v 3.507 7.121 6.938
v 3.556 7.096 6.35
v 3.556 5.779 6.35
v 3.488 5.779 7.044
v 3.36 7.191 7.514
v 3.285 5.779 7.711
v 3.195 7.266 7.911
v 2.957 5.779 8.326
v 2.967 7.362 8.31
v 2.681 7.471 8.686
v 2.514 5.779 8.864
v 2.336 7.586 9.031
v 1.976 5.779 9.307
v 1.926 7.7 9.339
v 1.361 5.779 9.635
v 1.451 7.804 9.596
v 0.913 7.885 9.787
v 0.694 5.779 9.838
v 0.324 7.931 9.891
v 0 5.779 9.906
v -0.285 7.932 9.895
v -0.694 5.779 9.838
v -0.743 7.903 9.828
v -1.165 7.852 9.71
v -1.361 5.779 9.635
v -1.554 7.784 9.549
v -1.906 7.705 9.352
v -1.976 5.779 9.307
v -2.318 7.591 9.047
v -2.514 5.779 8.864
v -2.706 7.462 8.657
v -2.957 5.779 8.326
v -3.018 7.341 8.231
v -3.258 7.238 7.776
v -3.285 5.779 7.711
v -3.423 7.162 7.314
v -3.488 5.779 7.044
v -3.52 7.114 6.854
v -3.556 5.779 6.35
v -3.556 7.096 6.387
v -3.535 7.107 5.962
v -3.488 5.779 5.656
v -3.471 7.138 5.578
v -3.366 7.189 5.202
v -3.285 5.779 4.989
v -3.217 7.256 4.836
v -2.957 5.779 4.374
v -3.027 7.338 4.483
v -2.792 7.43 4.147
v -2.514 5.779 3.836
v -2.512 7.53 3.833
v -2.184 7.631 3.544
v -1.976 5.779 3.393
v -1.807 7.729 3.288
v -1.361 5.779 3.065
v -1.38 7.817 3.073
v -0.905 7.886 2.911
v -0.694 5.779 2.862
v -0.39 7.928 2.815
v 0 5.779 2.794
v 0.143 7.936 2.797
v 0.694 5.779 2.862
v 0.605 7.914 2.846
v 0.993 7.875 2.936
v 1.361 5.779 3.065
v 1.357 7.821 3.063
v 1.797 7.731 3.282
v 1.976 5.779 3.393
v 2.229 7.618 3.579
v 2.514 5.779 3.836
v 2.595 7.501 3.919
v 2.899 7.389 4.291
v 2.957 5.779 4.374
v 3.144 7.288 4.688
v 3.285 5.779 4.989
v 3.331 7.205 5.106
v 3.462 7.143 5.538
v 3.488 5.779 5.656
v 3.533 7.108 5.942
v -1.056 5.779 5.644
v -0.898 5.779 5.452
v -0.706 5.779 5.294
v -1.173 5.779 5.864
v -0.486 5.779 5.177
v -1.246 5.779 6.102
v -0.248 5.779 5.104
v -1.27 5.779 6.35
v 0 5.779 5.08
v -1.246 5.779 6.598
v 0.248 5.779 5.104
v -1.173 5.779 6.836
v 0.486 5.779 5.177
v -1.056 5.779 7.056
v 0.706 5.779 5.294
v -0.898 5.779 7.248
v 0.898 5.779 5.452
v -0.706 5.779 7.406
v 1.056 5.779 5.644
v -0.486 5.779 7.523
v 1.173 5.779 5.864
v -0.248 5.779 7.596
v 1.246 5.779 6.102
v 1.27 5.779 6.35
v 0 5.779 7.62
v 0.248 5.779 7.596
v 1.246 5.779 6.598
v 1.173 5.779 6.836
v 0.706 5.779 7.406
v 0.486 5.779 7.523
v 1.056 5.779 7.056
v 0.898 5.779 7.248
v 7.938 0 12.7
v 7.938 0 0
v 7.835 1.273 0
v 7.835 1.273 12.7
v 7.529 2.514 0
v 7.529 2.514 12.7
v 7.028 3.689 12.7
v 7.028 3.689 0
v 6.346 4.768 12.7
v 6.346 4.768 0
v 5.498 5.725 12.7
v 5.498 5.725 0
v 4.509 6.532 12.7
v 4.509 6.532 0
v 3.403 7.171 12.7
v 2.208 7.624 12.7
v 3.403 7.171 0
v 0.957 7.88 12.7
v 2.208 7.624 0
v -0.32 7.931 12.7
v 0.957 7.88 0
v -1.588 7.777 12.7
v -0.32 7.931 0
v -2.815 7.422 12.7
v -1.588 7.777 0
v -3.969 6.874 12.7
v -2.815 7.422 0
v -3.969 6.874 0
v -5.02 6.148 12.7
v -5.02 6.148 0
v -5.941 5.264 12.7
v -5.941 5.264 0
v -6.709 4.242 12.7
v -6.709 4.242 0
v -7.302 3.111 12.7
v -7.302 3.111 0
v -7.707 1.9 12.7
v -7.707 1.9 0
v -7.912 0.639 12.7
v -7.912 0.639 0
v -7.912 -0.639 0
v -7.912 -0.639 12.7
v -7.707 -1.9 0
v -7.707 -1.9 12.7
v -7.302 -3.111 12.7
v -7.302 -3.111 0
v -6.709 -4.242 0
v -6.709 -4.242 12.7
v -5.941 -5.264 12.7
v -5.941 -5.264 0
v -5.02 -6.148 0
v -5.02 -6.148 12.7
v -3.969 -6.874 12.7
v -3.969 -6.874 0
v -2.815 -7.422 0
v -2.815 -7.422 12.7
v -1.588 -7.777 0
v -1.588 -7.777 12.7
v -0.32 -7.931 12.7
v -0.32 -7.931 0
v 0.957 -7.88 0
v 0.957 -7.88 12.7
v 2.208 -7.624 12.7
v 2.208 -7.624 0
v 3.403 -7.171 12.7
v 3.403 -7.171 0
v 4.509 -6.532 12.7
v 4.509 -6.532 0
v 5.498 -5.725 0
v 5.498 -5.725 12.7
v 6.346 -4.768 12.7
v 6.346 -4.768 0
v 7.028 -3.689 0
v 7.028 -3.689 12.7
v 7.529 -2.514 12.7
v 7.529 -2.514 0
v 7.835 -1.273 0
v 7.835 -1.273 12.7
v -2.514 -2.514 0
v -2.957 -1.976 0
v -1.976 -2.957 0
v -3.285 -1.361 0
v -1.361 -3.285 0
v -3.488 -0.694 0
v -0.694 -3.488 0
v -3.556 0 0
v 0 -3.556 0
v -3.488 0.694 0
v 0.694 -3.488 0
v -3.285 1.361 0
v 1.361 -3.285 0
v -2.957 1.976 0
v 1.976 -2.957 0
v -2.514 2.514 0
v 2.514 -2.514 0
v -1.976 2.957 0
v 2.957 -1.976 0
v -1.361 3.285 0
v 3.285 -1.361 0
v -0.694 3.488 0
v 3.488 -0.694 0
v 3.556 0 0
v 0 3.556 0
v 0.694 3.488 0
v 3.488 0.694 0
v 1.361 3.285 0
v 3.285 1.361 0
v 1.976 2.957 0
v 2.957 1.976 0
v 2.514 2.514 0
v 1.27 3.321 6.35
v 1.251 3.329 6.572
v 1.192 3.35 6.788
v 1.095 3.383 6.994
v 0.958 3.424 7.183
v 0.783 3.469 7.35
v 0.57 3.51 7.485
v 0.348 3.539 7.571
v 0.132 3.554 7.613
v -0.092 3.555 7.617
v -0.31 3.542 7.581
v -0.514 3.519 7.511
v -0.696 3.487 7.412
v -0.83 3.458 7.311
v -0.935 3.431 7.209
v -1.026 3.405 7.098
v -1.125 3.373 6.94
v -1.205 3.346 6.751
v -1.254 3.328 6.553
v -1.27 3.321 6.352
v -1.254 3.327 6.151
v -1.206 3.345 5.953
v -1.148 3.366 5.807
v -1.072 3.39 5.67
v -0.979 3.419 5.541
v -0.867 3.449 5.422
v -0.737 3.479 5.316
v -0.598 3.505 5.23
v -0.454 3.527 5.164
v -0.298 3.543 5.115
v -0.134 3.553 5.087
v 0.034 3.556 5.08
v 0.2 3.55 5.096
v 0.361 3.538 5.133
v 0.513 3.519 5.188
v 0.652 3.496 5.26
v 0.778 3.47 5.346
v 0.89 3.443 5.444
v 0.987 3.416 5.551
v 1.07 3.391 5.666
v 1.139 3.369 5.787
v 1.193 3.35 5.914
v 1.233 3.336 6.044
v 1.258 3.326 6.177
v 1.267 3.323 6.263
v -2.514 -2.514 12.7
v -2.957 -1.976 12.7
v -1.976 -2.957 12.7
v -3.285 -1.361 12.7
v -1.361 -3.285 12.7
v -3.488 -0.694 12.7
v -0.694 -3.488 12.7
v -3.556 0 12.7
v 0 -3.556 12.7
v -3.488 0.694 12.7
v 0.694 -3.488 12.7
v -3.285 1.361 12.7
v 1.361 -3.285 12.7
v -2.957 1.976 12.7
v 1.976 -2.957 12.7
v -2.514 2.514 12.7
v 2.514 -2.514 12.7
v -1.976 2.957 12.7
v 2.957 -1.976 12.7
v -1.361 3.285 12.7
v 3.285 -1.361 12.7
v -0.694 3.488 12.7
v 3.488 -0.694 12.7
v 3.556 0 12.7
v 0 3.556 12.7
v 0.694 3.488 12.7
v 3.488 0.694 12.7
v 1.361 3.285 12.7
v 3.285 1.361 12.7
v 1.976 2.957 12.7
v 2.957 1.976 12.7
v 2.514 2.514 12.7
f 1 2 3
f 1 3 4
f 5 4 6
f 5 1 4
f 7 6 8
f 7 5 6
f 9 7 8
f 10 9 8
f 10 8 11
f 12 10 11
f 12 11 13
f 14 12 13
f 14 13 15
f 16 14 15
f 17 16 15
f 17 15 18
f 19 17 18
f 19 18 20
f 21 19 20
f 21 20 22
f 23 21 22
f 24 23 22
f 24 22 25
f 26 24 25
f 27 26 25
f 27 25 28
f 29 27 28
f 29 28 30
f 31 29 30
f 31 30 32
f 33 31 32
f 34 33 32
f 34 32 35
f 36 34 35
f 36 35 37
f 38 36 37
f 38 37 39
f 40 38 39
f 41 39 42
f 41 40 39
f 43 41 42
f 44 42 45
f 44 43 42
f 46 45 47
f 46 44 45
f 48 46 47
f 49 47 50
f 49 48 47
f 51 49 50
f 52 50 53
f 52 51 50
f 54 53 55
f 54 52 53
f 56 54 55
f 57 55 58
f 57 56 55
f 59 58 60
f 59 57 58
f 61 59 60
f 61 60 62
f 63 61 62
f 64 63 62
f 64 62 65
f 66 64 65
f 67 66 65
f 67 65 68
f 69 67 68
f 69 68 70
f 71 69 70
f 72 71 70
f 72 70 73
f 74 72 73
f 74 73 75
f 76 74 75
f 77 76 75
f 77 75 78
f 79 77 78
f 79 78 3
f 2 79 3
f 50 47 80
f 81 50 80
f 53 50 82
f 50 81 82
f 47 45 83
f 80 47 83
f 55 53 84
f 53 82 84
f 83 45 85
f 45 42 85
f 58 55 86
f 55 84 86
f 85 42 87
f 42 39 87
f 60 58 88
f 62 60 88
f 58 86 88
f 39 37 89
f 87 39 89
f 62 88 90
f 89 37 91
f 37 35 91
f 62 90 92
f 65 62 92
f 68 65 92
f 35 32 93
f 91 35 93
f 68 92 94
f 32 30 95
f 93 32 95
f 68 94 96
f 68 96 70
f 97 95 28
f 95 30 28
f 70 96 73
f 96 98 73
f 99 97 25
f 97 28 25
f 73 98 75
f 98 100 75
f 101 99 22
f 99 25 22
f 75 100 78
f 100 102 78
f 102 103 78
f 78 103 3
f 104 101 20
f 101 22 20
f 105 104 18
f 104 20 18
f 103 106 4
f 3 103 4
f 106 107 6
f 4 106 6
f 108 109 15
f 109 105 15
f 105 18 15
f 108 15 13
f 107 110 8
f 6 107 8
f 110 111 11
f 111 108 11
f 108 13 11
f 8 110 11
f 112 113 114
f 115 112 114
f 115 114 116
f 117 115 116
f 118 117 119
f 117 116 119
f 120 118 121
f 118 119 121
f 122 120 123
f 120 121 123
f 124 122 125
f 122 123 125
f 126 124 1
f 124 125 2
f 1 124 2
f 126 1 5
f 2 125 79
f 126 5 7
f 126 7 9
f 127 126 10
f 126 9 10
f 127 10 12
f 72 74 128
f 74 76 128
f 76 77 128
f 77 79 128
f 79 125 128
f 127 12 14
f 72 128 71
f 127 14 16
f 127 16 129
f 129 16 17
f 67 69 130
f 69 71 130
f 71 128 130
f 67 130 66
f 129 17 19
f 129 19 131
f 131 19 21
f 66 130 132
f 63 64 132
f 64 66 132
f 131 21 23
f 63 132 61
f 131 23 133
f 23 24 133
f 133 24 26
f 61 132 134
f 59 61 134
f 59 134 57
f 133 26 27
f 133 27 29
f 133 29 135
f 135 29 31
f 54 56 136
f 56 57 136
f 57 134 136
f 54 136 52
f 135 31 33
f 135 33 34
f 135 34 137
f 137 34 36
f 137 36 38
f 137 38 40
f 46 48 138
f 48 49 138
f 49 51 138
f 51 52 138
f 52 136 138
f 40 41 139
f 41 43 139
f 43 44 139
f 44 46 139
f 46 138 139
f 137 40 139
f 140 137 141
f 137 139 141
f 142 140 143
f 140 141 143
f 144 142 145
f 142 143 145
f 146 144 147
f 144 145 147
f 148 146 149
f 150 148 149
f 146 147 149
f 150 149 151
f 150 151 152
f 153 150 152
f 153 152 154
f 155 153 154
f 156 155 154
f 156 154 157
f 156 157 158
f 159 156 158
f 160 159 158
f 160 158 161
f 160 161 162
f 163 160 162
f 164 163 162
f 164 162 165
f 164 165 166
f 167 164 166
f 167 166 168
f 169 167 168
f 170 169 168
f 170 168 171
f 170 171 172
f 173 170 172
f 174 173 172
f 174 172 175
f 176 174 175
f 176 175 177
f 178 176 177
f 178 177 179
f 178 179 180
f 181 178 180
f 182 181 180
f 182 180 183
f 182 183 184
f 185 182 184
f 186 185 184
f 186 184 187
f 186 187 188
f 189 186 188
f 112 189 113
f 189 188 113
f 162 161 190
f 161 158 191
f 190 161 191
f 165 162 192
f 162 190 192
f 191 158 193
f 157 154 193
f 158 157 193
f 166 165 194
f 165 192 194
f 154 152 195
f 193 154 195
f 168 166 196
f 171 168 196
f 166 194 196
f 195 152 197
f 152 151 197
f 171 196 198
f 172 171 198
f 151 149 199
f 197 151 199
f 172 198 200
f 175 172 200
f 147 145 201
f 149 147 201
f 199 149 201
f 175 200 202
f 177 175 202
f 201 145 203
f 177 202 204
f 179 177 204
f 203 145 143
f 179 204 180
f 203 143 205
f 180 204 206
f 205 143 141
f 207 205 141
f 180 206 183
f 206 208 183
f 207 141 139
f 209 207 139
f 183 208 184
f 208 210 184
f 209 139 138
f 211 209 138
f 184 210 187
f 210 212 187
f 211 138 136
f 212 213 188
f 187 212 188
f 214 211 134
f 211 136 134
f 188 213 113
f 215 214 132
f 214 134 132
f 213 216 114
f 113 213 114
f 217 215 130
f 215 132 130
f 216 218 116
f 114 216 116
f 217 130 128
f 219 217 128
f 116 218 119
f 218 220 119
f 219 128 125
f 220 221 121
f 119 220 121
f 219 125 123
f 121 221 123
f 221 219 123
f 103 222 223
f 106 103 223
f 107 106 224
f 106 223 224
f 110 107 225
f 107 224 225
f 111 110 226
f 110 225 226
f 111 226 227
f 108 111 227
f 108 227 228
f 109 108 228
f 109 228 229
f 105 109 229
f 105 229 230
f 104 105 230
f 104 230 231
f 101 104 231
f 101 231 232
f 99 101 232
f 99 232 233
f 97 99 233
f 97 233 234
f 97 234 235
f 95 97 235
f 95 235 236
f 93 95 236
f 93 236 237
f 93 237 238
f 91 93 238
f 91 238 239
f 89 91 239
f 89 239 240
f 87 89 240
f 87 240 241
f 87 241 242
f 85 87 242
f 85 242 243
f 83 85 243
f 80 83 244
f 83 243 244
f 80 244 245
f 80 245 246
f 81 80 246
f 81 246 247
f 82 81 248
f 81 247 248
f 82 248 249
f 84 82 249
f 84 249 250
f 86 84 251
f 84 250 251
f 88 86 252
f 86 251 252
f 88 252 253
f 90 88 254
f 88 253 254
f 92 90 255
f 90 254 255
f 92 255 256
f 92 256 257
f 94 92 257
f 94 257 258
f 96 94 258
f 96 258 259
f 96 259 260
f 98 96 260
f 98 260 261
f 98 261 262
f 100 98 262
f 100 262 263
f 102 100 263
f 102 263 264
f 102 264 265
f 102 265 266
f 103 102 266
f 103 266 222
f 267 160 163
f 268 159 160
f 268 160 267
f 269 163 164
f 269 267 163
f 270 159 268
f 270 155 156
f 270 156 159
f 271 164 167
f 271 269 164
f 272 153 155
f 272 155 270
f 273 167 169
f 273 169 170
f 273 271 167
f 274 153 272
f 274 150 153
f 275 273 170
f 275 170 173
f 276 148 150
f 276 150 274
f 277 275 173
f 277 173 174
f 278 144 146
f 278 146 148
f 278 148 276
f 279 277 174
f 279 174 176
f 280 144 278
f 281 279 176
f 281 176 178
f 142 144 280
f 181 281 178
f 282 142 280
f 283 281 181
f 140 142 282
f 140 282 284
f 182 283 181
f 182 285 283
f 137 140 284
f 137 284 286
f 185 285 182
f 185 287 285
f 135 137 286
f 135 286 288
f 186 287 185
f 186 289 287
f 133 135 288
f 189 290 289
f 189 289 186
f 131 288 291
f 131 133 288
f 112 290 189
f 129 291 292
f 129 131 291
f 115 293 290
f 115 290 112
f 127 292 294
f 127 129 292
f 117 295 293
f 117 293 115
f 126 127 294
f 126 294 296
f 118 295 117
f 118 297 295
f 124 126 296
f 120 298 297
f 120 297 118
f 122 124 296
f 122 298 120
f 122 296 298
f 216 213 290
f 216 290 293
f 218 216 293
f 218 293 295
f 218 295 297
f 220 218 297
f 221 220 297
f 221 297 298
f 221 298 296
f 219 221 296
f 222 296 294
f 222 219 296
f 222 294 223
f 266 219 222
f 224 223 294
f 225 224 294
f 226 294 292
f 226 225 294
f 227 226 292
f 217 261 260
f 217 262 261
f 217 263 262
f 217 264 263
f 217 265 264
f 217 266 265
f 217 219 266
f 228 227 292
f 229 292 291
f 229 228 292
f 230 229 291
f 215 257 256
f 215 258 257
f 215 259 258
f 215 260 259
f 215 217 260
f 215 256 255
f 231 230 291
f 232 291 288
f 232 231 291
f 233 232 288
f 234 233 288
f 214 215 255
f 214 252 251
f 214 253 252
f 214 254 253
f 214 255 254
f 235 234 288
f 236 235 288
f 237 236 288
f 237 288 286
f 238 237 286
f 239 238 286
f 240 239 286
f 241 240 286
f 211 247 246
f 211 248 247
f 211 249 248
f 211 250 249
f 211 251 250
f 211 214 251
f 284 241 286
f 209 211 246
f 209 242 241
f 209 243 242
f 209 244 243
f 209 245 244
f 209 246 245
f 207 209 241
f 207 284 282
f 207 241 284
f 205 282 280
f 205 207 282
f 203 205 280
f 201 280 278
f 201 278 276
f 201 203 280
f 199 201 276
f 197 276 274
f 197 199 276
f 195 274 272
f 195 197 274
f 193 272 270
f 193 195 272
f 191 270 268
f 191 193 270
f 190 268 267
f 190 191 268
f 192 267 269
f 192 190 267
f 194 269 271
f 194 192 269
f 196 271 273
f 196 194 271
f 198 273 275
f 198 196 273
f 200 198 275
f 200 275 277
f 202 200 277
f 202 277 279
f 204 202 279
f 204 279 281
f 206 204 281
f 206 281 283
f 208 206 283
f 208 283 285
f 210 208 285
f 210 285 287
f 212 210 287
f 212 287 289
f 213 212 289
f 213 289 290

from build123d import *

# Parameters (mm, degrees)
F0_R     = 7.9375
F0_R_2   = 3.556
F1_DEPTH = 12.7
F2_R     = 1.27
F3_DEPTH = 7.9385
F5_R     = 3.556
F6_DEPTH = 5.334


with BuildPart() as f1:
    # F0 (on Top) → F1 (new body)
    with BuildSketch(Plane.XY):
        Circle(F0_R)
        Circle(F0_R_2, mode=Mode.SUBTRACT)
    extrude(amount=F1_DEPTH)

    # F2 (on Front) → F3 (cut, through all)
    with BuildSketch(Plane.XZ):
        with Locations((0, 6.35)):
            Circle(F2_R)
    extrude(amount=-F3_DEPTH, mode=Mode.SUBTRACT)

    # F5 (on offset) → F6 (cut)
    with BuildSketch(Plane.XZ.offset(-11.1125)):
        with Locations((0, 6.35)):
            Circle(F5_R)
    extrude(amount=F6_DEPTH, mode=Mode.SUBTRACT)


solid = f1.part
